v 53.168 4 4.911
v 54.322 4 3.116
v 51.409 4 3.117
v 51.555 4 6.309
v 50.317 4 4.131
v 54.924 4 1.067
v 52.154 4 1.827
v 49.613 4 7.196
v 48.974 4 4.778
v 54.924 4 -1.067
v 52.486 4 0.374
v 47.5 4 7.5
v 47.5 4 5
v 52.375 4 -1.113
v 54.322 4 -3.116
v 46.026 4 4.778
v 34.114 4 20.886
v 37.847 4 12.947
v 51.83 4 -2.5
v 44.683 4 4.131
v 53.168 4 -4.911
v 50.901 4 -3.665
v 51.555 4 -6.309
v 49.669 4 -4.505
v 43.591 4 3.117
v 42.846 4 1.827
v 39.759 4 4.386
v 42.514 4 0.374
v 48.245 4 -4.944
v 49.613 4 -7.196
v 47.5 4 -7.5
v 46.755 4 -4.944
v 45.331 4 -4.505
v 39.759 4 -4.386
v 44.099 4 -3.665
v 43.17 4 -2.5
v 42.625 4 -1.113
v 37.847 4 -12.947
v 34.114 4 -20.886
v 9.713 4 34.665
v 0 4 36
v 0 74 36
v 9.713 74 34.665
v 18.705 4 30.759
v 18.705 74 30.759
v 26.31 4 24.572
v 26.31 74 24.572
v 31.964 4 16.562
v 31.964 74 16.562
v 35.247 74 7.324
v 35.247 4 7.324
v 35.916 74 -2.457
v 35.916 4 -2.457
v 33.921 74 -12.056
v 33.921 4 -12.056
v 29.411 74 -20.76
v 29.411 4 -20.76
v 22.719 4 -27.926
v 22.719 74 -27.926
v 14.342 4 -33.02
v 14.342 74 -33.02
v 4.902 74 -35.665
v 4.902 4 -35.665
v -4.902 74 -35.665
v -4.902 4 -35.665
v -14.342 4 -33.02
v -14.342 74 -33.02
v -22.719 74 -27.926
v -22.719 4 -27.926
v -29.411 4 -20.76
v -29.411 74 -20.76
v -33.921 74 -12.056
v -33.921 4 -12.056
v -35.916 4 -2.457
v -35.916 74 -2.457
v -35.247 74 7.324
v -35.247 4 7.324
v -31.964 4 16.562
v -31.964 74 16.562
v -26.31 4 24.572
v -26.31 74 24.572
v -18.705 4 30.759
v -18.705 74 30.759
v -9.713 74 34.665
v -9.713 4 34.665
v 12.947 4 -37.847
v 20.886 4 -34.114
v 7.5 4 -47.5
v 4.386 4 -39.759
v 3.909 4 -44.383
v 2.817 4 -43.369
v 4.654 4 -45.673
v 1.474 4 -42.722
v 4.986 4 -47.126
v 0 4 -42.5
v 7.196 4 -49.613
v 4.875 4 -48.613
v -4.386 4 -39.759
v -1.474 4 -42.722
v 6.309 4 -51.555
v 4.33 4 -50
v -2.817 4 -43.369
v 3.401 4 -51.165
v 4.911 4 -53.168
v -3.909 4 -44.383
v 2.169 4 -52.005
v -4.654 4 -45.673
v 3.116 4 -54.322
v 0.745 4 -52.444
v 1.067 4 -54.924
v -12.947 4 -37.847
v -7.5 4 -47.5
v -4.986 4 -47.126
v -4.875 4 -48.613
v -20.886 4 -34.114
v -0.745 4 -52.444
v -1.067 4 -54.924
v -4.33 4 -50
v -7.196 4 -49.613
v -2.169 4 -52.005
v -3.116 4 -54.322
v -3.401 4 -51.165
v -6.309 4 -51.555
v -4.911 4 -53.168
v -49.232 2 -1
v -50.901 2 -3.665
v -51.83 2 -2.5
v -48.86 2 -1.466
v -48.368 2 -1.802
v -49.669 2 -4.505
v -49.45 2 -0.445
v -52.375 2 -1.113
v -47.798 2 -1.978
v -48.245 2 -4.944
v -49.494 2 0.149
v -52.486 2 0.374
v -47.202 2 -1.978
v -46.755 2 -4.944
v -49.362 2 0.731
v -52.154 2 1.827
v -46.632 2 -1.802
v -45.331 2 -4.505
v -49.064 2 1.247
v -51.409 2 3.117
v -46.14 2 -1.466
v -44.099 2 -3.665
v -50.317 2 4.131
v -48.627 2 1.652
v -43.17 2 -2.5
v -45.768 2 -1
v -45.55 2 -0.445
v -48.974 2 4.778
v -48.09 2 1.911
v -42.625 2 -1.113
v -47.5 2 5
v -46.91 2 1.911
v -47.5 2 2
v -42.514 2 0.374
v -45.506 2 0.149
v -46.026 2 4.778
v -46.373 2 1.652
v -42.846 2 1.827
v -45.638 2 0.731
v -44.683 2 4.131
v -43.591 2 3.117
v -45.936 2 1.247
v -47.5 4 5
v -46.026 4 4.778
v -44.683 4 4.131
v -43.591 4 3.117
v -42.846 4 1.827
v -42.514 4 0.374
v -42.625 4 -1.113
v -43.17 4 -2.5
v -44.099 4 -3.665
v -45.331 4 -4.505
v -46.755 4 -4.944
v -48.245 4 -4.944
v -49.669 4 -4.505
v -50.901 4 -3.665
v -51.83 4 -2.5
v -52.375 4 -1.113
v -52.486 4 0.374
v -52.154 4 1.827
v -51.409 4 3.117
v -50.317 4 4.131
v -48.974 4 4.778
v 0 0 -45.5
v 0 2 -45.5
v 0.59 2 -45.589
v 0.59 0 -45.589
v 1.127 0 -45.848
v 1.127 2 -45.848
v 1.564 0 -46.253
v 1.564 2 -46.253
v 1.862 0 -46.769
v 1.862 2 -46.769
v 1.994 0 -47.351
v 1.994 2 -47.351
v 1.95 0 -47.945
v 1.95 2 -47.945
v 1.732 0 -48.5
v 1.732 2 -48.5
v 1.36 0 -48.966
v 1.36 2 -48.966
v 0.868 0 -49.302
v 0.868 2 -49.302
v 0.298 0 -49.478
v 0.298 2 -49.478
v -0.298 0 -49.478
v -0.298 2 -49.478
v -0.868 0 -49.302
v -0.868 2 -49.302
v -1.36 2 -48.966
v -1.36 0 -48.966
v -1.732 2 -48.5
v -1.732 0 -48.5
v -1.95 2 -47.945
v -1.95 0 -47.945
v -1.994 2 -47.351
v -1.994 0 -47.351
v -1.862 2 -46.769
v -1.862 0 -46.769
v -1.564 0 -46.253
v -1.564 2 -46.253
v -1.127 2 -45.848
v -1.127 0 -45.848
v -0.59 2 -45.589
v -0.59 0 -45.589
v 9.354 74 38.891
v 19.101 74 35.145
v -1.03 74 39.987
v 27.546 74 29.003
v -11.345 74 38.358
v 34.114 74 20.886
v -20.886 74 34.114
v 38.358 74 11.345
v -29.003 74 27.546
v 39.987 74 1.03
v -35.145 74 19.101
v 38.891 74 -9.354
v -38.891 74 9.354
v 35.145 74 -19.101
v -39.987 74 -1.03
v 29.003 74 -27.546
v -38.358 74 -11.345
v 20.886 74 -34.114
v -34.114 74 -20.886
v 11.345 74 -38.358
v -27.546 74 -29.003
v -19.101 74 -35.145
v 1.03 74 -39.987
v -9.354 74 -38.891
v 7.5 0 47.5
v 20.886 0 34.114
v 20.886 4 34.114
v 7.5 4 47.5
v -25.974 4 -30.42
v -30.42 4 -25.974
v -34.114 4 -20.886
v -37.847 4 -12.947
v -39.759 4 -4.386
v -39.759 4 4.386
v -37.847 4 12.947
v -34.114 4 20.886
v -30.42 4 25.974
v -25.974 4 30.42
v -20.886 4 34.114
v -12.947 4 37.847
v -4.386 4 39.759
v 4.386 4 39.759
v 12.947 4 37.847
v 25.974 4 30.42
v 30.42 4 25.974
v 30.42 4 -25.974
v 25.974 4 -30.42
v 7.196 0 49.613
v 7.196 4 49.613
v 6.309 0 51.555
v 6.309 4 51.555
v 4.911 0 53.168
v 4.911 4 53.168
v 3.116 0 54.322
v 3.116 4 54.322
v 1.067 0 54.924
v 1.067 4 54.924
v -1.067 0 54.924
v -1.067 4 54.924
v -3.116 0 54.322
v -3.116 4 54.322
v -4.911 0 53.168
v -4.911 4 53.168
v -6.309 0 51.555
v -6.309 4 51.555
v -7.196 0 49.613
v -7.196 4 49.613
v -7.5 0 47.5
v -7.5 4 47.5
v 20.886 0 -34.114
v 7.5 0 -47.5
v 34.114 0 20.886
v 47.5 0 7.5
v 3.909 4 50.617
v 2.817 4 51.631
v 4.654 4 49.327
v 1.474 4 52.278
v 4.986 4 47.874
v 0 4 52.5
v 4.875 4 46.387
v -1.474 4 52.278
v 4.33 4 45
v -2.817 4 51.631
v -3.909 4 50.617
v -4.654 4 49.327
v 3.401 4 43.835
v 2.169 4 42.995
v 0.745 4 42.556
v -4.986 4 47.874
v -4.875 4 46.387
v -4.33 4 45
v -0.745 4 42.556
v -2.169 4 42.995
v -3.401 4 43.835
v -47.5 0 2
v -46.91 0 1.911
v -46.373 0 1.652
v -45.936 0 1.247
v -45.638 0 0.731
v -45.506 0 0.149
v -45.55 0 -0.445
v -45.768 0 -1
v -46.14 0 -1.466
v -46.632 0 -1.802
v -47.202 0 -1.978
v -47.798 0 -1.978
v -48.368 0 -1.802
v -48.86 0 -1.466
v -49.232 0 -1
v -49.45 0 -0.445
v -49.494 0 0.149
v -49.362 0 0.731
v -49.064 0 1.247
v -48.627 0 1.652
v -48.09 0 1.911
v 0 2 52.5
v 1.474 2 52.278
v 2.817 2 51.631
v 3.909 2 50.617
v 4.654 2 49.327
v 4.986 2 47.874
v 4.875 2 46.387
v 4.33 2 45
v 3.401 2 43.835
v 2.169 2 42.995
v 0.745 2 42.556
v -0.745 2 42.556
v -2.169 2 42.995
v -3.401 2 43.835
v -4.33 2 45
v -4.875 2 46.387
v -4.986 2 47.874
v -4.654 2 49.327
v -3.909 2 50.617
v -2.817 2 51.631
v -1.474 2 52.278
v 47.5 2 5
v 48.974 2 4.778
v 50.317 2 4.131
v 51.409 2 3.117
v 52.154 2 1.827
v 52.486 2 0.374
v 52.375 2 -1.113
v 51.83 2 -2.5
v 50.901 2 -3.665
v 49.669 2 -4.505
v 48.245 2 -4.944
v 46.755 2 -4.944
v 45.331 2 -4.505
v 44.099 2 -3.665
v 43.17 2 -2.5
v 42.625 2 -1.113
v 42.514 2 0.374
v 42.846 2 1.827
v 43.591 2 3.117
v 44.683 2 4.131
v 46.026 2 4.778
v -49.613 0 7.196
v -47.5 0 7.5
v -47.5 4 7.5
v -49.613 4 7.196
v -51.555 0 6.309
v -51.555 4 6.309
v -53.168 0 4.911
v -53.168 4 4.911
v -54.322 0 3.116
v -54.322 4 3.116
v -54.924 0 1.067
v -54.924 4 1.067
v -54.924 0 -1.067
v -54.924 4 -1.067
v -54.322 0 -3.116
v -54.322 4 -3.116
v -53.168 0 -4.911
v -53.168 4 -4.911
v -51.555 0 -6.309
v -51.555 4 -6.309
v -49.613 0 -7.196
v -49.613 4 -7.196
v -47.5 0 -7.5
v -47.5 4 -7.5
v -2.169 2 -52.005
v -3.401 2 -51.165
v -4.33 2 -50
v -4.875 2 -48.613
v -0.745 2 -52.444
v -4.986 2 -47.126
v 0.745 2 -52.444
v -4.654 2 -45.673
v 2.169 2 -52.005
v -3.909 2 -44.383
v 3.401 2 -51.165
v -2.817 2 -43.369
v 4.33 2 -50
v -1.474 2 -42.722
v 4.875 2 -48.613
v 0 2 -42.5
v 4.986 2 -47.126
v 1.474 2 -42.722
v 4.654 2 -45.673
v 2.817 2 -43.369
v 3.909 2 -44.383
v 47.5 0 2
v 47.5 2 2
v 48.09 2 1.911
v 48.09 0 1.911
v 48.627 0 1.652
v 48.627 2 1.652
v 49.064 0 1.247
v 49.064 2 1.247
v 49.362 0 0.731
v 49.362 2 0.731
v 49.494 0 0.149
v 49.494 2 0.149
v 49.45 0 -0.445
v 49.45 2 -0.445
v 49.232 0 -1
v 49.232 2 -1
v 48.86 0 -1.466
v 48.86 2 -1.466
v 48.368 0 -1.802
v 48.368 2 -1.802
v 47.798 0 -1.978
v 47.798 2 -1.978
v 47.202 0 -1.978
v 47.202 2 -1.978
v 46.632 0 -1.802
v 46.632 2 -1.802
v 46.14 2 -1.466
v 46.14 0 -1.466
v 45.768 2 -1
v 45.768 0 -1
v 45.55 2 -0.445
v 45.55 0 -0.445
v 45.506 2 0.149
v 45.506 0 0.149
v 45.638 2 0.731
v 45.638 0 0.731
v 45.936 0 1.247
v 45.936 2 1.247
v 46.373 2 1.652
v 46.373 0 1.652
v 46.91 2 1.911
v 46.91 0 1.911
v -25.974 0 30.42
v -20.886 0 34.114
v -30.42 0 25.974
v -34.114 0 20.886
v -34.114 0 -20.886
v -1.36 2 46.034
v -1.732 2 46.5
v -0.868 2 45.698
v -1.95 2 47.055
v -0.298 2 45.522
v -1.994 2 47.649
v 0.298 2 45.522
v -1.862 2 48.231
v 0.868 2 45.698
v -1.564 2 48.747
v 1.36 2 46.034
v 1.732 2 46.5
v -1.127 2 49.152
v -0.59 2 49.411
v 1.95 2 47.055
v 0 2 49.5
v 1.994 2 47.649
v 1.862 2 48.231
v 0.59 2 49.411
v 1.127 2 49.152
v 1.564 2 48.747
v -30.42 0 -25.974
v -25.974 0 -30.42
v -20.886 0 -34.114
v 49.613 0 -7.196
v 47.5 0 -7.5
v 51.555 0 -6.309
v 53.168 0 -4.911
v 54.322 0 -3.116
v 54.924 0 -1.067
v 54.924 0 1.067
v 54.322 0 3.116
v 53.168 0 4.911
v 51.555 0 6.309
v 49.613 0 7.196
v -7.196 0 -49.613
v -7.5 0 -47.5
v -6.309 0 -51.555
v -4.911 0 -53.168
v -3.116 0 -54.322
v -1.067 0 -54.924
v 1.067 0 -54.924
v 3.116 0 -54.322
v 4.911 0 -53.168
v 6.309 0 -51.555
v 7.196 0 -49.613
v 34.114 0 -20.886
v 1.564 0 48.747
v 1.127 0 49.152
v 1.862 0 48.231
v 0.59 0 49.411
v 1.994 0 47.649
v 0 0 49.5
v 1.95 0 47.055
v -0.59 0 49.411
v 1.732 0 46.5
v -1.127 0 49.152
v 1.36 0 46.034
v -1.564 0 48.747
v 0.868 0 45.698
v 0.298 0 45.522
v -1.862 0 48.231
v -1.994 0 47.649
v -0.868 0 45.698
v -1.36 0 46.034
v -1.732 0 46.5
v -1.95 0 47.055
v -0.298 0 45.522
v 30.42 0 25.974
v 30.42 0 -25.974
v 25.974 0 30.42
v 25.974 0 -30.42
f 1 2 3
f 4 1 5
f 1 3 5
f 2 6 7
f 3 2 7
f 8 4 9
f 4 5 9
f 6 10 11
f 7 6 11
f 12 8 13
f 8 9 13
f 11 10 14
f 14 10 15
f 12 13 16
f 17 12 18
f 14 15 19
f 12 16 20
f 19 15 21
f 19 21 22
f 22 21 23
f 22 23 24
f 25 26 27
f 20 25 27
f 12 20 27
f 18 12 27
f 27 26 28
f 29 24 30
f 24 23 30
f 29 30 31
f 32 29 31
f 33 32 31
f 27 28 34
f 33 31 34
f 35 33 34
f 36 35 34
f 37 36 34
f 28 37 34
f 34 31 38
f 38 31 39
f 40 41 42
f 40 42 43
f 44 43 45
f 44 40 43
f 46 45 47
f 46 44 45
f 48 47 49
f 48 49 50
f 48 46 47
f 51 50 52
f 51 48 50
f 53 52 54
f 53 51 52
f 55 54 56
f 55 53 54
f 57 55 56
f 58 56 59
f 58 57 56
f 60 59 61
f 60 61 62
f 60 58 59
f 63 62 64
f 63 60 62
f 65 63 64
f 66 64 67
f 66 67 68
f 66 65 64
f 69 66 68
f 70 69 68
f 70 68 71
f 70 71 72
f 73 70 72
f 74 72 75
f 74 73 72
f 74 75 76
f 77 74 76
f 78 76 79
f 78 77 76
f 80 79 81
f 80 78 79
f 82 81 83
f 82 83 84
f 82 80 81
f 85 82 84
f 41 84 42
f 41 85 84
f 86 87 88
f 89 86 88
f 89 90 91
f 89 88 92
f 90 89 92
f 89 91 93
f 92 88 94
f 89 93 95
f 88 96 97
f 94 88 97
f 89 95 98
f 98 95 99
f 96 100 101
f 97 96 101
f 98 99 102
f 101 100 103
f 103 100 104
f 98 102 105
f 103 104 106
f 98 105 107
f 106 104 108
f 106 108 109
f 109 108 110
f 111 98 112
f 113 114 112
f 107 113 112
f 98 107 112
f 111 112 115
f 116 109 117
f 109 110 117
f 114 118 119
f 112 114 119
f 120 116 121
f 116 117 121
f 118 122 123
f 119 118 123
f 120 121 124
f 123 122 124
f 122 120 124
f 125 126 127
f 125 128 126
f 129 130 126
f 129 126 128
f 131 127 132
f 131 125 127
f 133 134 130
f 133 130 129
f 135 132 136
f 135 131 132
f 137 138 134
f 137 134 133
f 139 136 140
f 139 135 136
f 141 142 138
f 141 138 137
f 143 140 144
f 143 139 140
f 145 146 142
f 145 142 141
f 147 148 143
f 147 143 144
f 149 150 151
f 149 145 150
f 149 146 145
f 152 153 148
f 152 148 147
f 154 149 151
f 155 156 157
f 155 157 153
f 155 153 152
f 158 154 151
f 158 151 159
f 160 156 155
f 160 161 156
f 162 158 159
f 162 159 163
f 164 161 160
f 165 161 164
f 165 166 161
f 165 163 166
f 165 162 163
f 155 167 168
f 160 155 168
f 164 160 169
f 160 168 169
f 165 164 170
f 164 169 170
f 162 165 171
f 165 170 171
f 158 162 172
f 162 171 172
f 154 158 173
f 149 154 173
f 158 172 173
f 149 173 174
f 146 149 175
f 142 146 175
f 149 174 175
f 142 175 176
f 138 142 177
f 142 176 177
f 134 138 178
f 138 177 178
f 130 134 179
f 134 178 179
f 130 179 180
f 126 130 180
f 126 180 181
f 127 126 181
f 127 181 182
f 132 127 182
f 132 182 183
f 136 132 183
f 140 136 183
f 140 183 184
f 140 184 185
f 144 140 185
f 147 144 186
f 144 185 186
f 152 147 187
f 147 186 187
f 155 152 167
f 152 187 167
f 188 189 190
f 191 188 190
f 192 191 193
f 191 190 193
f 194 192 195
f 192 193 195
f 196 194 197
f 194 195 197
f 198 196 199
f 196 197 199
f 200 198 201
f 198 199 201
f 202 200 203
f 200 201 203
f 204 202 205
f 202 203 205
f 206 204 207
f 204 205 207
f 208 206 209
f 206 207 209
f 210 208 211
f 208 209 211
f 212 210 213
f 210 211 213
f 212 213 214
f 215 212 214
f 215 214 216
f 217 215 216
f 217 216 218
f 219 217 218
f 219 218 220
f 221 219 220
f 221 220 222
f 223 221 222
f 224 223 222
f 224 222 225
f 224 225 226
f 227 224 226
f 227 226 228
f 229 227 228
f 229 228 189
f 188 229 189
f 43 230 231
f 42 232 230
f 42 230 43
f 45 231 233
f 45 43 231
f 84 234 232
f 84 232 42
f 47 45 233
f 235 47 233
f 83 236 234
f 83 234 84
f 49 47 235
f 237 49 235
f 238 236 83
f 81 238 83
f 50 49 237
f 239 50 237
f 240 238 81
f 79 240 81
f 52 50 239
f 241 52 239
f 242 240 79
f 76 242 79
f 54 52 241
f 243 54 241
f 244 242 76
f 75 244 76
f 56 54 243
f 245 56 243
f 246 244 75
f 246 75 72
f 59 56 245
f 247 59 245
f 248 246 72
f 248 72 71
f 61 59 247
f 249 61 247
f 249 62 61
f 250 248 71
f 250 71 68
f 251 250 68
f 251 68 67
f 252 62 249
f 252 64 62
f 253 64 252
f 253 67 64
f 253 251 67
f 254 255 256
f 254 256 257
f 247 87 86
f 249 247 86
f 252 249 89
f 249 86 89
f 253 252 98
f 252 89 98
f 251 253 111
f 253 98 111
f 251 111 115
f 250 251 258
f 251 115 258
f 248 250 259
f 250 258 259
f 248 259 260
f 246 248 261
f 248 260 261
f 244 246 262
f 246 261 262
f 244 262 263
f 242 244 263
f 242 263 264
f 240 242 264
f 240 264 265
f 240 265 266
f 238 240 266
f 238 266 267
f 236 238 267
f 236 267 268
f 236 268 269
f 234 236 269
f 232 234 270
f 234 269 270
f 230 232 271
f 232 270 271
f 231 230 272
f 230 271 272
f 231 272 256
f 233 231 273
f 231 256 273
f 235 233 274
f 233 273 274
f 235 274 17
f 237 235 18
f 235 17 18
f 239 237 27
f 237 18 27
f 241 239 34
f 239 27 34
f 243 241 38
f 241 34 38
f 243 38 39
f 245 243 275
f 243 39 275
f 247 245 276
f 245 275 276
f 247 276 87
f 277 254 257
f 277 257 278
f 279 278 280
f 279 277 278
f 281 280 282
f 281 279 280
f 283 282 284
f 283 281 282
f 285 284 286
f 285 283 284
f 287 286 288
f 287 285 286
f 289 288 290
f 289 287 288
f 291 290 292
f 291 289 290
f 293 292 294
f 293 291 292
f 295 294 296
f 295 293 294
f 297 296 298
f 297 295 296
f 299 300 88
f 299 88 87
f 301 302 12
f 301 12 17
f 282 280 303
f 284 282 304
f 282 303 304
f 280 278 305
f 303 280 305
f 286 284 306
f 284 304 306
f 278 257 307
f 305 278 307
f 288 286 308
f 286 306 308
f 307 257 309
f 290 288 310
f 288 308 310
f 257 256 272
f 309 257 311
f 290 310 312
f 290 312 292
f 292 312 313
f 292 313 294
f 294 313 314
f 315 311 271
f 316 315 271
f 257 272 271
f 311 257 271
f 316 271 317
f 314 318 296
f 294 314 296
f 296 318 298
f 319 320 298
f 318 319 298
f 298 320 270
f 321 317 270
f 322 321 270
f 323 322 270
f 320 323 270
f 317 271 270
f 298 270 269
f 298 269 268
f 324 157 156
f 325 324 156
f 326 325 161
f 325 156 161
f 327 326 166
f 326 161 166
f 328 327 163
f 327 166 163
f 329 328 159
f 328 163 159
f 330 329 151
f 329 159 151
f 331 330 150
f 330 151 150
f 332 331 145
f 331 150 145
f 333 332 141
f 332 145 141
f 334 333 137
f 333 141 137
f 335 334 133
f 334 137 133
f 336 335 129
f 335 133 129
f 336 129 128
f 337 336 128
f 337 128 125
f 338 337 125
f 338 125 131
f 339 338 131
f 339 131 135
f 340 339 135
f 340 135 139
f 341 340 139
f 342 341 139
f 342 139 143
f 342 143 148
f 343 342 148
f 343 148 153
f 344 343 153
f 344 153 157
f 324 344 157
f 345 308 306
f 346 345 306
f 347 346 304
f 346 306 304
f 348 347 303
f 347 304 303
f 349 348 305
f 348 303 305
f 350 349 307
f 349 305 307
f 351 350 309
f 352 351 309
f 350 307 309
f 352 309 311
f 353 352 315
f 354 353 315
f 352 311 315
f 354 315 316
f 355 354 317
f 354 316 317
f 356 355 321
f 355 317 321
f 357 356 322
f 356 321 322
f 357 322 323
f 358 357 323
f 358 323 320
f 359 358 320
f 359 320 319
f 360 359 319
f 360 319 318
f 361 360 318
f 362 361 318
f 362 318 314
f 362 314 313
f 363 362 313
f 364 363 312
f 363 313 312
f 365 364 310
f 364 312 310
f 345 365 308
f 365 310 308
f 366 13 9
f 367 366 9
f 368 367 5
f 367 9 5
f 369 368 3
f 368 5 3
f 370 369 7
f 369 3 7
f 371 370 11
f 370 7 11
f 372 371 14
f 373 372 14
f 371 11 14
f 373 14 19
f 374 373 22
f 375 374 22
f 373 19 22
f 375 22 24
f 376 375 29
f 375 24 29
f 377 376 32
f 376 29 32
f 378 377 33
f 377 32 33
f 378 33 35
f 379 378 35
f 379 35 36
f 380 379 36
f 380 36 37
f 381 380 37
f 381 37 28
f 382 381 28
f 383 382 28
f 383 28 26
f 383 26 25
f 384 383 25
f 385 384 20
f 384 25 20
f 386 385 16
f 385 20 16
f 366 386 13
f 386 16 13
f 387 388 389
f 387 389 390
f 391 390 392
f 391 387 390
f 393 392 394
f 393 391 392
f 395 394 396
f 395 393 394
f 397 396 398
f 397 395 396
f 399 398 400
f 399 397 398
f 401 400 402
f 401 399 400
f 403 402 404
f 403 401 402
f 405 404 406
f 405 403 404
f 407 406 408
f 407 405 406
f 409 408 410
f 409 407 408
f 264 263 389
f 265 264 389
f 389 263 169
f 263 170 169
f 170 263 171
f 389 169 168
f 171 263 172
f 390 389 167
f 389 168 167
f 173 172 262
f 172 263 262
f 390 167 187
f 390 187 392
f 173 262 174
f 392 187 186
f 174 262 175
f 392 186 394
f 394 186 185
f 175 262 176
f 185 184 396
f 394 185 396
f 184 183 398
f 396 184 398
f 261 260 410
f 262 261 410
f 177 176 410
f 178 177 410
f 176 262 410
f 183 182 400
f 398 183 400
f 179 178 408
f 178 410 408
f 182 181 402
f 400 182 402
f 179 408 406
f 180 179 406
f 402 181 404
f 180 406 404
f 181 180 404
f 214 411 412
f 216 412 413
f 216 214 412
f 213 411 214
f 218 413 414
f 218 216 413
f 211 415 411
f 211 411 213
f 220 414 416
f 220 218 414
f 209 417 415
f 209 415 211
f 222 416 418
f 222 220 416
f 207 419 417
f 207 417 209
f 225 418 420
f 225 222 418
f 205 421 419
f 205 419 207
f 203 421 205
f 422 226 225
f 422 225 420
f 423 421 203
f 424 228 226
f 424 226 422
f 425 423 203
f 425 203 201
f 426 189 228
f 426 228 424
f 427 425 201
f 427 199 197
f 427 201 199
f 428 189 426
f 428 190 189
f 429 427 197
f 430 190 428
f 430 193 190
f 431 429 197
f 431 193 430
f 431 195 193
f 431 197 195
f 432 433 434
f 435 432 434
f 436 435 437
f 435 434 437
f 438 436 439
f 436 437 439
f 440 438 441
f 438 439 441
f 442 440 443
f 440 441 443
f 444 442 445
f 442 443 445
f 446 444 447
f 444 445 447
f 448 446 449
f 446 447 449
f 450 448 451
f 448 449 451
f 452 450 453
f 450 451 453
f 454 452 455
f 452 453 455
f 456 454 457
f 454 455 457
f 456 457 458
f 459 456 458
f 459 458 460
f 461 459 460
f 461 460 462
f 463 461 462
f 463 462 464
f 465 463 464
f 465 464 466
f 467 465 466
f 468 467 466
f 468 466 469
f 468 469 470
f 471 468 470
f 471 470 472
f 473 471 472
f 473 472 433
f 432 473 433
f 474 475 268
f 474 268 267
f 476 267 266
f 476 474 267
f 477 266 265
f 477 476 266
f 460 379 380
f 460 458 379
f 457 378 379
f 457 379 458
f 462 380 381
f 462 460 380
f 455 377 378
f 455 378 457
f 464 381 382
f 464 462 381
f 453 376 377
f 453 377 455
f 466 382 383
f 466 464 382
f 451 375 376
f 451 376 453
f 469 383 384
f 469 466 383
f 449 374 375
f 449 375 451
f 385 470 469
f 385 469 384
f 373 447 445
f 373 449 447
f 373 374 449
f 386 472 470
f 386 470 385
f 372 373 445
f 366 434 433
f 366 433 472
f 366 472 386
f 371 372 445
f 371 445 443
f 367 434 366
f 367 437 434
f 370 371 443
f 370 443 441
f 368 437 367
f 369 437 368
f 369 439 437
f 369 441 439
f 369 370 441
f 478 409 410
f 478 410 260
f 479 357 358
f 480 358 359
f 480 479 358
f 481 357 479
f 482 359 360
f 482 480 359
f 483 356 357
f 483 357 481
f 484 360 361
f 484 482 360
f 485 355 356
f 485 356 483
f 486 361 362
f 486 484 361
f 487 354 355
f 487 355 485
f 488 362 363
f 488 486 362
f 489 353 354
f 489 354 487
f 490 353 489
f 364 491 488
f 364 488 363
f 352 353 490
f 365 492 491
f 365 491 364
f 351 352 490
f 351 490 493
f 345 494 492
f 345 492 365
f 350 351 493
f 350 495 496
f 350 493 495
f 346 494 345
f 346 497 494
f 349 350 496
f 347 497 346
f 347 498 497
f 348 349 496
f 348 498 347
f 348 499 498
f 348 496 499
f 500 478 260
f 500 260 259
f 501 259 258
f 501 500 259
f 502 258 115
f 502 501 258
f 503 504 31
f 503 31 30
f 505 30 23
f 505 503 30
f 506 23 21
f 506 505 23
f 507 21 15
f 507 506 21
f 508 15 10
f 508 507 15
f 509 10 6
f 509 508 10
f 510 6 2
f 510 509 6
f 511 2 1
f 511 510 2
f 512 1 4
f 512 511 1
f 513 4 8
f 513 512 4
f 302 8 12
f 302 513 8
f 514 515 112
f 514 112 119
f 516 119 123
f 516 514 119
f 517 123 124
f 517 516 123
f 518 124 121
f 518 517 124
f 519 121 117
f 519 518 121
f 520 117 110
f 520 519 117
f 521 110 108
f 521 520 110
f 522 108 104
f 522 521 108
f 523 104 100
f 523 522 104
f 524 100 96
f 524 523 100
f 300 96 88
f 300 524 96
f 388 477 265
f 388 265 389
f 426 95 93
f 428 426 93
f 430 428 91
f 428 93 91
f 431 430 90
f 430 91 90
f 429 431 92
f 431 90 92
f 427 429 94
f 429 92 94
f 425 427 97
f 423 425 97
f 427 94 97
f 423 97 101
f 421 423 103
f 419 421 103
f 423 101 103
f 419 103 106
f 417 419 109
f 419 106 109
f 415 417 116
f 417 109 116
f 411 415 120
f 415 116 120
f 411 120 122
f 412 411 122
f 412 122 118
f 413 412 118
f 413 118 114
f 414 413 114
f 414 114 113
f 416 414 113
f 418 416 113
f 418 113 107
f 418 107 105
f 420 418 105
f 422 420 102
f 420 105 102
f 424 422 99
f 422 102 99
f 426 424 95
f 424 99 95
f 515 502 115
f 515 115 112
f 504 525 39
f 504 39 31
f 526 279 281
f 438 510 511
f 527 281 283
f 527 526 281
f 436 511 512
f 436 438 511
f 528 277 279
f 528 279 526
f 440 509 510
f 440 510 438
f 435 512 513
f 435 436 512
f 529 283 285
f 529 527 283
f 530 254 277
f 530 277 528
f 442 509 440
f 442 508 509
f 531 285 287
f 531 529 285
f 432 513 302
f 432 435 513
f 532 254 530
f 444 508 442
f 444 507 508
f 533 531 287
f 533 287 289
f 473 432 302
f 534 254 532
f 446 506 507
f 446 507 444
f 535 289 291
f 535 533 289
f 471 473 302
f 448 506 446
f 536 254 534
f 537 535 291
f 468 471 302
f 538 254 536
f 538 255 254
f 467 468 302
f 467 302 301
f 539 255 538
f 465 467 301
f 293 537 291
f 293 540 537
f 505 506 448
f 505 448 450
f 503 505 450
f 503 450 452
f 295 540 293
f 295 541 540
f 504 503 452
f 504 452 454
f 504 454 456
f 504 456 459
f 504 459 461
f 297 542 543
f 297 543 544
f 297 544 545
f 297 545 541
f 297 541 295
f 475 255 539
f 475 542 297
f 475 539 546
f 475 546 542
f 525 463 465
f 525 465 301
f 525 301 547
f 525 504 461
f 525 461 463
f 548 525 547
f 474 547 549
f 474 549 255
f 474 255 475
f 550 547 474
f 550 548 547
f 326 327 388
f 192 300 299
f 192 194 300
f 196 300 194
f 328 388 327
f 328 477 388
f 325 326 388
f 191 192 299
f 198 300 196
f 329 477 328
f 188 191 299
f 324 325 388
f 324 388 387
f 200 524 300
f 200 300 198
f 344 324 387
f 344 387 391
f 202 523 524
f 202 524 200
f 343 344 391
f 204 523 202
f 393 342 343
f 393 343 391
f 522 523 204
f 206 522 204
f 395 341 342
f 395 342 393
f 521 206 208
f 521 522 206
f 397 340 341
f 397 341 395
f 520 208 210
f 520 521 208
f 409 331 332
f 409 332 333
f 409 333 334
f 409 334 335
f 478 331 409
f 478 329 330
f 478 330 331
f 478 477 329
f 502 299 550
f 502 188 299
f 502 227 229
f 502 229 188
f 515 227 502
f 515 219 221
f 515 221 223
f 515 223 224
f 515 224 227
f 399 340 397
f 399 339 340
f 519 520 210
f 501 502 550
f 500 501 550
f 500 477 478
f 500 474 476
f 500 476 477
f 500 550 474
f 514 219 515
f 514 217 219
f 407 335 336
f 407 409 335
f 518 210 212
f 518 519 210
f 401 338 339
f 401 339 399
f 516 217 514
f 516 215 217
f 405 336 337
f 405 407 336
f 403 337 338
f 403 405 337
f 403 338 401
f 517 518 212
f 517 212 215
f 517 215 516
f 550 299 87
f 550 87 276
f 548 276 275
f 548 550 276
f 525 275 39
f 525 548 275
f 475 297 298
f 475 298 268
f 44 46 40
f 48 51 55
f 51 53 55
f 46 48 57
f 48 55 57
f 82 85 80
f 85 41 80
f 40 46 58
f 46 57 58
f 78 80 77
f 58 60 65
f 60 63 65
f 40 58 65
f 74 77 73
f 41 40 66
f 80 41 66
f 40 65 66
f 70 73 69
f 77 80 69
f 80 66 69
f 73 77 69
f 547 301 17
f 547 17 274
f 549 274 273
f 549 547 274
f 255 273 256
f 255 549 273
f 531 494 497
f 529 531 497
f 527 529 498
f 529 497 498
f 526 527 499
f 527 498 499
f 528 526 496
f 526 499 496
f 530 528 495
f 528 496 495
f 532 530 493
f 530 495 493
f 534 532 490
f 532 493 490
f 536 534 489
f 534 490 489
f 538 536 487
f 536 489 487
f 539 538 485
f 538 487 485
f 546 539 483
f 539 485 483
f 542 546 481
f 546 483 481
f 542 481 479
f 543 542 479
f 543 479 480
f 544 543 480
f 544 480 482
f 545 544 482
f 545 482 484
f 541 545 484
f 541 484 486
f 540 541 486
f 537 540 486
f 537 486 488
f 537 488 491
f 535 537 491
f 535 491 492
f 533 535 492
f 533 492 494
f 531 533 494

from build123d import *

# Parameters (mm, degrees)
BOSS_EXTRUDE1_DEPTH = 4
SKETCH2_R           = 2
CUT_EXTRUDE1_DEPTH  = 4
SKETCH3_R           = 5
CUT_EXTRUDE2_DEPTH  = 2
SKETCH4_R           = 40
SKETCH4_R_2         = 36
BOSS_EXTRUDE2_DEPTH = 70


with BuildPart() as part:
    # Sketch1 → Boss-Extrude1 (new body)
    with BuildSketch(Plane(origin=(0, 0, 0), x_dir=(1, 0, 0), z_dir=(0, 1, 0))):
        with BuildLine():
            Line((-47.5, 7.5), (-34.114378278, 20.885621722))
            ThreePointArc((-34.114378278, 20.885621722), (-28.284271247, 28.284271247), (-20.885621722, 34.114378278))
            Line((-20.885621722, 34.114378278), (-7.5, 47.5))
            ThreePointArc((-7.5, 47.5), (0, 55), (7.5, 47.5))
            Line((7.5, 47.5), (20.885621722, 34.114378278))
            ThreePointArc((20.885621722, 34.114378278), (28.284271247, 28.284271247), (34.114378278, 20.885621722))
            Line((34.114378278, 20.885621722), (47.5, 7.5))
            ThreePointArc((47.5, 7.5), (55, 0), (47.5, -7.5))
            Line((47.5, -7.5), (34.114378278, -20.885621722))
            ThreePointArc((34.114378278, -20.885621722), (28.284271247, -28.284271247), (20.885621722, -34.114378278))
            Line((20.885621722, -34.114378278), (7.5, -47.5))
            ThreePointArc((7.5, -47.5), (0, -55), (-7.5, -47.5))
            Line((-7.5, -47.5), (-20.885621722, -34.114378278))
            ThreePointArc((-20.885621722, -34.114378278), (-28.284271247, -28.284271247), (-34.114378278, -20.885621722))
            Line((-34.114378278, -20.885621722), (-47.5, -7.5))
            ThreePointArc((-47.5, -7.5), (-55, 0), (-47.5, 7.5))
        make_face()
    extrude(amount=BOSS_EXTRUDE1_DEPTH)

    # Sketch2 → Cut-Extrude1 (cut)
    with BuildSketch(Plane(origin=(0, 4, 0), x_dir=(1, 0, 0), z_dir=(0, 1, 0))):
        with Locations(Location((-47.5, 0, 0), (0, 0, 270))):
            Circle(SKETCH2_R)
        with Locations(Location((0, 47.5, 0), (0, 0, 270))):
            Circle(SKETCH2_R)
        with Locations(Location((47.5, 0, 0), (0, 0, 270))):
            Circle(SKETCH2_R)
        with Locations(Location((0, -47.5, 0), (0, 0, 270))):
            Circle(SKETCH2_R)
    extrude(amount=-CUT_EXTRUDE1_DEPTH, mode=Mode.SUBTRACT)

    # Sketch3 → Cut-Extrude2 (cut)
    with BuildSketch(Plane(origin=(0, 4, 0), x_dir=(1, 0, 0), z_dir=(0, 1, 0))):
        with Locations(Location((-47.5, 0, 0), (0, 0, 270))):
            Circle(SKETCH3_R)
        with Locations(Location((0, 47.5, 0), (0, 0, 270))):
            Circle(SKETCH3_R)
        with Locations(Location((47.5, 0, 0), (0, 0, 270))):
            Circle(SKETCH3_R)
        with Locations(Location((0, -47.5, 0), (0, 0, 270))):
            Circle(SKETCH3_R)
    extrude(amount=-CUT_EXTRUDE2_DEPTH, mode=Mode.SUBTRACT)

    # Sketch4 → Boss-Extrude2 (add)
    with BuildSketch(Plane(origin=(0, 4, 0), x_dir=(1, 0, 0), z_dir=(0, 1, 0))):
        with Locations(Location((0, 0, 0), (0, 0, 58.524055273))):
            Circle(SKETCH4_R)
        with Locations(Location((0, 0, 0), (0, 0, 270))):
            Circle(SKETCH4_R_2, mode=Mode.SUBTRACT)
    extrude(amount=BOSS_EXTRUDE2_DEPTH)


solid = part.part
